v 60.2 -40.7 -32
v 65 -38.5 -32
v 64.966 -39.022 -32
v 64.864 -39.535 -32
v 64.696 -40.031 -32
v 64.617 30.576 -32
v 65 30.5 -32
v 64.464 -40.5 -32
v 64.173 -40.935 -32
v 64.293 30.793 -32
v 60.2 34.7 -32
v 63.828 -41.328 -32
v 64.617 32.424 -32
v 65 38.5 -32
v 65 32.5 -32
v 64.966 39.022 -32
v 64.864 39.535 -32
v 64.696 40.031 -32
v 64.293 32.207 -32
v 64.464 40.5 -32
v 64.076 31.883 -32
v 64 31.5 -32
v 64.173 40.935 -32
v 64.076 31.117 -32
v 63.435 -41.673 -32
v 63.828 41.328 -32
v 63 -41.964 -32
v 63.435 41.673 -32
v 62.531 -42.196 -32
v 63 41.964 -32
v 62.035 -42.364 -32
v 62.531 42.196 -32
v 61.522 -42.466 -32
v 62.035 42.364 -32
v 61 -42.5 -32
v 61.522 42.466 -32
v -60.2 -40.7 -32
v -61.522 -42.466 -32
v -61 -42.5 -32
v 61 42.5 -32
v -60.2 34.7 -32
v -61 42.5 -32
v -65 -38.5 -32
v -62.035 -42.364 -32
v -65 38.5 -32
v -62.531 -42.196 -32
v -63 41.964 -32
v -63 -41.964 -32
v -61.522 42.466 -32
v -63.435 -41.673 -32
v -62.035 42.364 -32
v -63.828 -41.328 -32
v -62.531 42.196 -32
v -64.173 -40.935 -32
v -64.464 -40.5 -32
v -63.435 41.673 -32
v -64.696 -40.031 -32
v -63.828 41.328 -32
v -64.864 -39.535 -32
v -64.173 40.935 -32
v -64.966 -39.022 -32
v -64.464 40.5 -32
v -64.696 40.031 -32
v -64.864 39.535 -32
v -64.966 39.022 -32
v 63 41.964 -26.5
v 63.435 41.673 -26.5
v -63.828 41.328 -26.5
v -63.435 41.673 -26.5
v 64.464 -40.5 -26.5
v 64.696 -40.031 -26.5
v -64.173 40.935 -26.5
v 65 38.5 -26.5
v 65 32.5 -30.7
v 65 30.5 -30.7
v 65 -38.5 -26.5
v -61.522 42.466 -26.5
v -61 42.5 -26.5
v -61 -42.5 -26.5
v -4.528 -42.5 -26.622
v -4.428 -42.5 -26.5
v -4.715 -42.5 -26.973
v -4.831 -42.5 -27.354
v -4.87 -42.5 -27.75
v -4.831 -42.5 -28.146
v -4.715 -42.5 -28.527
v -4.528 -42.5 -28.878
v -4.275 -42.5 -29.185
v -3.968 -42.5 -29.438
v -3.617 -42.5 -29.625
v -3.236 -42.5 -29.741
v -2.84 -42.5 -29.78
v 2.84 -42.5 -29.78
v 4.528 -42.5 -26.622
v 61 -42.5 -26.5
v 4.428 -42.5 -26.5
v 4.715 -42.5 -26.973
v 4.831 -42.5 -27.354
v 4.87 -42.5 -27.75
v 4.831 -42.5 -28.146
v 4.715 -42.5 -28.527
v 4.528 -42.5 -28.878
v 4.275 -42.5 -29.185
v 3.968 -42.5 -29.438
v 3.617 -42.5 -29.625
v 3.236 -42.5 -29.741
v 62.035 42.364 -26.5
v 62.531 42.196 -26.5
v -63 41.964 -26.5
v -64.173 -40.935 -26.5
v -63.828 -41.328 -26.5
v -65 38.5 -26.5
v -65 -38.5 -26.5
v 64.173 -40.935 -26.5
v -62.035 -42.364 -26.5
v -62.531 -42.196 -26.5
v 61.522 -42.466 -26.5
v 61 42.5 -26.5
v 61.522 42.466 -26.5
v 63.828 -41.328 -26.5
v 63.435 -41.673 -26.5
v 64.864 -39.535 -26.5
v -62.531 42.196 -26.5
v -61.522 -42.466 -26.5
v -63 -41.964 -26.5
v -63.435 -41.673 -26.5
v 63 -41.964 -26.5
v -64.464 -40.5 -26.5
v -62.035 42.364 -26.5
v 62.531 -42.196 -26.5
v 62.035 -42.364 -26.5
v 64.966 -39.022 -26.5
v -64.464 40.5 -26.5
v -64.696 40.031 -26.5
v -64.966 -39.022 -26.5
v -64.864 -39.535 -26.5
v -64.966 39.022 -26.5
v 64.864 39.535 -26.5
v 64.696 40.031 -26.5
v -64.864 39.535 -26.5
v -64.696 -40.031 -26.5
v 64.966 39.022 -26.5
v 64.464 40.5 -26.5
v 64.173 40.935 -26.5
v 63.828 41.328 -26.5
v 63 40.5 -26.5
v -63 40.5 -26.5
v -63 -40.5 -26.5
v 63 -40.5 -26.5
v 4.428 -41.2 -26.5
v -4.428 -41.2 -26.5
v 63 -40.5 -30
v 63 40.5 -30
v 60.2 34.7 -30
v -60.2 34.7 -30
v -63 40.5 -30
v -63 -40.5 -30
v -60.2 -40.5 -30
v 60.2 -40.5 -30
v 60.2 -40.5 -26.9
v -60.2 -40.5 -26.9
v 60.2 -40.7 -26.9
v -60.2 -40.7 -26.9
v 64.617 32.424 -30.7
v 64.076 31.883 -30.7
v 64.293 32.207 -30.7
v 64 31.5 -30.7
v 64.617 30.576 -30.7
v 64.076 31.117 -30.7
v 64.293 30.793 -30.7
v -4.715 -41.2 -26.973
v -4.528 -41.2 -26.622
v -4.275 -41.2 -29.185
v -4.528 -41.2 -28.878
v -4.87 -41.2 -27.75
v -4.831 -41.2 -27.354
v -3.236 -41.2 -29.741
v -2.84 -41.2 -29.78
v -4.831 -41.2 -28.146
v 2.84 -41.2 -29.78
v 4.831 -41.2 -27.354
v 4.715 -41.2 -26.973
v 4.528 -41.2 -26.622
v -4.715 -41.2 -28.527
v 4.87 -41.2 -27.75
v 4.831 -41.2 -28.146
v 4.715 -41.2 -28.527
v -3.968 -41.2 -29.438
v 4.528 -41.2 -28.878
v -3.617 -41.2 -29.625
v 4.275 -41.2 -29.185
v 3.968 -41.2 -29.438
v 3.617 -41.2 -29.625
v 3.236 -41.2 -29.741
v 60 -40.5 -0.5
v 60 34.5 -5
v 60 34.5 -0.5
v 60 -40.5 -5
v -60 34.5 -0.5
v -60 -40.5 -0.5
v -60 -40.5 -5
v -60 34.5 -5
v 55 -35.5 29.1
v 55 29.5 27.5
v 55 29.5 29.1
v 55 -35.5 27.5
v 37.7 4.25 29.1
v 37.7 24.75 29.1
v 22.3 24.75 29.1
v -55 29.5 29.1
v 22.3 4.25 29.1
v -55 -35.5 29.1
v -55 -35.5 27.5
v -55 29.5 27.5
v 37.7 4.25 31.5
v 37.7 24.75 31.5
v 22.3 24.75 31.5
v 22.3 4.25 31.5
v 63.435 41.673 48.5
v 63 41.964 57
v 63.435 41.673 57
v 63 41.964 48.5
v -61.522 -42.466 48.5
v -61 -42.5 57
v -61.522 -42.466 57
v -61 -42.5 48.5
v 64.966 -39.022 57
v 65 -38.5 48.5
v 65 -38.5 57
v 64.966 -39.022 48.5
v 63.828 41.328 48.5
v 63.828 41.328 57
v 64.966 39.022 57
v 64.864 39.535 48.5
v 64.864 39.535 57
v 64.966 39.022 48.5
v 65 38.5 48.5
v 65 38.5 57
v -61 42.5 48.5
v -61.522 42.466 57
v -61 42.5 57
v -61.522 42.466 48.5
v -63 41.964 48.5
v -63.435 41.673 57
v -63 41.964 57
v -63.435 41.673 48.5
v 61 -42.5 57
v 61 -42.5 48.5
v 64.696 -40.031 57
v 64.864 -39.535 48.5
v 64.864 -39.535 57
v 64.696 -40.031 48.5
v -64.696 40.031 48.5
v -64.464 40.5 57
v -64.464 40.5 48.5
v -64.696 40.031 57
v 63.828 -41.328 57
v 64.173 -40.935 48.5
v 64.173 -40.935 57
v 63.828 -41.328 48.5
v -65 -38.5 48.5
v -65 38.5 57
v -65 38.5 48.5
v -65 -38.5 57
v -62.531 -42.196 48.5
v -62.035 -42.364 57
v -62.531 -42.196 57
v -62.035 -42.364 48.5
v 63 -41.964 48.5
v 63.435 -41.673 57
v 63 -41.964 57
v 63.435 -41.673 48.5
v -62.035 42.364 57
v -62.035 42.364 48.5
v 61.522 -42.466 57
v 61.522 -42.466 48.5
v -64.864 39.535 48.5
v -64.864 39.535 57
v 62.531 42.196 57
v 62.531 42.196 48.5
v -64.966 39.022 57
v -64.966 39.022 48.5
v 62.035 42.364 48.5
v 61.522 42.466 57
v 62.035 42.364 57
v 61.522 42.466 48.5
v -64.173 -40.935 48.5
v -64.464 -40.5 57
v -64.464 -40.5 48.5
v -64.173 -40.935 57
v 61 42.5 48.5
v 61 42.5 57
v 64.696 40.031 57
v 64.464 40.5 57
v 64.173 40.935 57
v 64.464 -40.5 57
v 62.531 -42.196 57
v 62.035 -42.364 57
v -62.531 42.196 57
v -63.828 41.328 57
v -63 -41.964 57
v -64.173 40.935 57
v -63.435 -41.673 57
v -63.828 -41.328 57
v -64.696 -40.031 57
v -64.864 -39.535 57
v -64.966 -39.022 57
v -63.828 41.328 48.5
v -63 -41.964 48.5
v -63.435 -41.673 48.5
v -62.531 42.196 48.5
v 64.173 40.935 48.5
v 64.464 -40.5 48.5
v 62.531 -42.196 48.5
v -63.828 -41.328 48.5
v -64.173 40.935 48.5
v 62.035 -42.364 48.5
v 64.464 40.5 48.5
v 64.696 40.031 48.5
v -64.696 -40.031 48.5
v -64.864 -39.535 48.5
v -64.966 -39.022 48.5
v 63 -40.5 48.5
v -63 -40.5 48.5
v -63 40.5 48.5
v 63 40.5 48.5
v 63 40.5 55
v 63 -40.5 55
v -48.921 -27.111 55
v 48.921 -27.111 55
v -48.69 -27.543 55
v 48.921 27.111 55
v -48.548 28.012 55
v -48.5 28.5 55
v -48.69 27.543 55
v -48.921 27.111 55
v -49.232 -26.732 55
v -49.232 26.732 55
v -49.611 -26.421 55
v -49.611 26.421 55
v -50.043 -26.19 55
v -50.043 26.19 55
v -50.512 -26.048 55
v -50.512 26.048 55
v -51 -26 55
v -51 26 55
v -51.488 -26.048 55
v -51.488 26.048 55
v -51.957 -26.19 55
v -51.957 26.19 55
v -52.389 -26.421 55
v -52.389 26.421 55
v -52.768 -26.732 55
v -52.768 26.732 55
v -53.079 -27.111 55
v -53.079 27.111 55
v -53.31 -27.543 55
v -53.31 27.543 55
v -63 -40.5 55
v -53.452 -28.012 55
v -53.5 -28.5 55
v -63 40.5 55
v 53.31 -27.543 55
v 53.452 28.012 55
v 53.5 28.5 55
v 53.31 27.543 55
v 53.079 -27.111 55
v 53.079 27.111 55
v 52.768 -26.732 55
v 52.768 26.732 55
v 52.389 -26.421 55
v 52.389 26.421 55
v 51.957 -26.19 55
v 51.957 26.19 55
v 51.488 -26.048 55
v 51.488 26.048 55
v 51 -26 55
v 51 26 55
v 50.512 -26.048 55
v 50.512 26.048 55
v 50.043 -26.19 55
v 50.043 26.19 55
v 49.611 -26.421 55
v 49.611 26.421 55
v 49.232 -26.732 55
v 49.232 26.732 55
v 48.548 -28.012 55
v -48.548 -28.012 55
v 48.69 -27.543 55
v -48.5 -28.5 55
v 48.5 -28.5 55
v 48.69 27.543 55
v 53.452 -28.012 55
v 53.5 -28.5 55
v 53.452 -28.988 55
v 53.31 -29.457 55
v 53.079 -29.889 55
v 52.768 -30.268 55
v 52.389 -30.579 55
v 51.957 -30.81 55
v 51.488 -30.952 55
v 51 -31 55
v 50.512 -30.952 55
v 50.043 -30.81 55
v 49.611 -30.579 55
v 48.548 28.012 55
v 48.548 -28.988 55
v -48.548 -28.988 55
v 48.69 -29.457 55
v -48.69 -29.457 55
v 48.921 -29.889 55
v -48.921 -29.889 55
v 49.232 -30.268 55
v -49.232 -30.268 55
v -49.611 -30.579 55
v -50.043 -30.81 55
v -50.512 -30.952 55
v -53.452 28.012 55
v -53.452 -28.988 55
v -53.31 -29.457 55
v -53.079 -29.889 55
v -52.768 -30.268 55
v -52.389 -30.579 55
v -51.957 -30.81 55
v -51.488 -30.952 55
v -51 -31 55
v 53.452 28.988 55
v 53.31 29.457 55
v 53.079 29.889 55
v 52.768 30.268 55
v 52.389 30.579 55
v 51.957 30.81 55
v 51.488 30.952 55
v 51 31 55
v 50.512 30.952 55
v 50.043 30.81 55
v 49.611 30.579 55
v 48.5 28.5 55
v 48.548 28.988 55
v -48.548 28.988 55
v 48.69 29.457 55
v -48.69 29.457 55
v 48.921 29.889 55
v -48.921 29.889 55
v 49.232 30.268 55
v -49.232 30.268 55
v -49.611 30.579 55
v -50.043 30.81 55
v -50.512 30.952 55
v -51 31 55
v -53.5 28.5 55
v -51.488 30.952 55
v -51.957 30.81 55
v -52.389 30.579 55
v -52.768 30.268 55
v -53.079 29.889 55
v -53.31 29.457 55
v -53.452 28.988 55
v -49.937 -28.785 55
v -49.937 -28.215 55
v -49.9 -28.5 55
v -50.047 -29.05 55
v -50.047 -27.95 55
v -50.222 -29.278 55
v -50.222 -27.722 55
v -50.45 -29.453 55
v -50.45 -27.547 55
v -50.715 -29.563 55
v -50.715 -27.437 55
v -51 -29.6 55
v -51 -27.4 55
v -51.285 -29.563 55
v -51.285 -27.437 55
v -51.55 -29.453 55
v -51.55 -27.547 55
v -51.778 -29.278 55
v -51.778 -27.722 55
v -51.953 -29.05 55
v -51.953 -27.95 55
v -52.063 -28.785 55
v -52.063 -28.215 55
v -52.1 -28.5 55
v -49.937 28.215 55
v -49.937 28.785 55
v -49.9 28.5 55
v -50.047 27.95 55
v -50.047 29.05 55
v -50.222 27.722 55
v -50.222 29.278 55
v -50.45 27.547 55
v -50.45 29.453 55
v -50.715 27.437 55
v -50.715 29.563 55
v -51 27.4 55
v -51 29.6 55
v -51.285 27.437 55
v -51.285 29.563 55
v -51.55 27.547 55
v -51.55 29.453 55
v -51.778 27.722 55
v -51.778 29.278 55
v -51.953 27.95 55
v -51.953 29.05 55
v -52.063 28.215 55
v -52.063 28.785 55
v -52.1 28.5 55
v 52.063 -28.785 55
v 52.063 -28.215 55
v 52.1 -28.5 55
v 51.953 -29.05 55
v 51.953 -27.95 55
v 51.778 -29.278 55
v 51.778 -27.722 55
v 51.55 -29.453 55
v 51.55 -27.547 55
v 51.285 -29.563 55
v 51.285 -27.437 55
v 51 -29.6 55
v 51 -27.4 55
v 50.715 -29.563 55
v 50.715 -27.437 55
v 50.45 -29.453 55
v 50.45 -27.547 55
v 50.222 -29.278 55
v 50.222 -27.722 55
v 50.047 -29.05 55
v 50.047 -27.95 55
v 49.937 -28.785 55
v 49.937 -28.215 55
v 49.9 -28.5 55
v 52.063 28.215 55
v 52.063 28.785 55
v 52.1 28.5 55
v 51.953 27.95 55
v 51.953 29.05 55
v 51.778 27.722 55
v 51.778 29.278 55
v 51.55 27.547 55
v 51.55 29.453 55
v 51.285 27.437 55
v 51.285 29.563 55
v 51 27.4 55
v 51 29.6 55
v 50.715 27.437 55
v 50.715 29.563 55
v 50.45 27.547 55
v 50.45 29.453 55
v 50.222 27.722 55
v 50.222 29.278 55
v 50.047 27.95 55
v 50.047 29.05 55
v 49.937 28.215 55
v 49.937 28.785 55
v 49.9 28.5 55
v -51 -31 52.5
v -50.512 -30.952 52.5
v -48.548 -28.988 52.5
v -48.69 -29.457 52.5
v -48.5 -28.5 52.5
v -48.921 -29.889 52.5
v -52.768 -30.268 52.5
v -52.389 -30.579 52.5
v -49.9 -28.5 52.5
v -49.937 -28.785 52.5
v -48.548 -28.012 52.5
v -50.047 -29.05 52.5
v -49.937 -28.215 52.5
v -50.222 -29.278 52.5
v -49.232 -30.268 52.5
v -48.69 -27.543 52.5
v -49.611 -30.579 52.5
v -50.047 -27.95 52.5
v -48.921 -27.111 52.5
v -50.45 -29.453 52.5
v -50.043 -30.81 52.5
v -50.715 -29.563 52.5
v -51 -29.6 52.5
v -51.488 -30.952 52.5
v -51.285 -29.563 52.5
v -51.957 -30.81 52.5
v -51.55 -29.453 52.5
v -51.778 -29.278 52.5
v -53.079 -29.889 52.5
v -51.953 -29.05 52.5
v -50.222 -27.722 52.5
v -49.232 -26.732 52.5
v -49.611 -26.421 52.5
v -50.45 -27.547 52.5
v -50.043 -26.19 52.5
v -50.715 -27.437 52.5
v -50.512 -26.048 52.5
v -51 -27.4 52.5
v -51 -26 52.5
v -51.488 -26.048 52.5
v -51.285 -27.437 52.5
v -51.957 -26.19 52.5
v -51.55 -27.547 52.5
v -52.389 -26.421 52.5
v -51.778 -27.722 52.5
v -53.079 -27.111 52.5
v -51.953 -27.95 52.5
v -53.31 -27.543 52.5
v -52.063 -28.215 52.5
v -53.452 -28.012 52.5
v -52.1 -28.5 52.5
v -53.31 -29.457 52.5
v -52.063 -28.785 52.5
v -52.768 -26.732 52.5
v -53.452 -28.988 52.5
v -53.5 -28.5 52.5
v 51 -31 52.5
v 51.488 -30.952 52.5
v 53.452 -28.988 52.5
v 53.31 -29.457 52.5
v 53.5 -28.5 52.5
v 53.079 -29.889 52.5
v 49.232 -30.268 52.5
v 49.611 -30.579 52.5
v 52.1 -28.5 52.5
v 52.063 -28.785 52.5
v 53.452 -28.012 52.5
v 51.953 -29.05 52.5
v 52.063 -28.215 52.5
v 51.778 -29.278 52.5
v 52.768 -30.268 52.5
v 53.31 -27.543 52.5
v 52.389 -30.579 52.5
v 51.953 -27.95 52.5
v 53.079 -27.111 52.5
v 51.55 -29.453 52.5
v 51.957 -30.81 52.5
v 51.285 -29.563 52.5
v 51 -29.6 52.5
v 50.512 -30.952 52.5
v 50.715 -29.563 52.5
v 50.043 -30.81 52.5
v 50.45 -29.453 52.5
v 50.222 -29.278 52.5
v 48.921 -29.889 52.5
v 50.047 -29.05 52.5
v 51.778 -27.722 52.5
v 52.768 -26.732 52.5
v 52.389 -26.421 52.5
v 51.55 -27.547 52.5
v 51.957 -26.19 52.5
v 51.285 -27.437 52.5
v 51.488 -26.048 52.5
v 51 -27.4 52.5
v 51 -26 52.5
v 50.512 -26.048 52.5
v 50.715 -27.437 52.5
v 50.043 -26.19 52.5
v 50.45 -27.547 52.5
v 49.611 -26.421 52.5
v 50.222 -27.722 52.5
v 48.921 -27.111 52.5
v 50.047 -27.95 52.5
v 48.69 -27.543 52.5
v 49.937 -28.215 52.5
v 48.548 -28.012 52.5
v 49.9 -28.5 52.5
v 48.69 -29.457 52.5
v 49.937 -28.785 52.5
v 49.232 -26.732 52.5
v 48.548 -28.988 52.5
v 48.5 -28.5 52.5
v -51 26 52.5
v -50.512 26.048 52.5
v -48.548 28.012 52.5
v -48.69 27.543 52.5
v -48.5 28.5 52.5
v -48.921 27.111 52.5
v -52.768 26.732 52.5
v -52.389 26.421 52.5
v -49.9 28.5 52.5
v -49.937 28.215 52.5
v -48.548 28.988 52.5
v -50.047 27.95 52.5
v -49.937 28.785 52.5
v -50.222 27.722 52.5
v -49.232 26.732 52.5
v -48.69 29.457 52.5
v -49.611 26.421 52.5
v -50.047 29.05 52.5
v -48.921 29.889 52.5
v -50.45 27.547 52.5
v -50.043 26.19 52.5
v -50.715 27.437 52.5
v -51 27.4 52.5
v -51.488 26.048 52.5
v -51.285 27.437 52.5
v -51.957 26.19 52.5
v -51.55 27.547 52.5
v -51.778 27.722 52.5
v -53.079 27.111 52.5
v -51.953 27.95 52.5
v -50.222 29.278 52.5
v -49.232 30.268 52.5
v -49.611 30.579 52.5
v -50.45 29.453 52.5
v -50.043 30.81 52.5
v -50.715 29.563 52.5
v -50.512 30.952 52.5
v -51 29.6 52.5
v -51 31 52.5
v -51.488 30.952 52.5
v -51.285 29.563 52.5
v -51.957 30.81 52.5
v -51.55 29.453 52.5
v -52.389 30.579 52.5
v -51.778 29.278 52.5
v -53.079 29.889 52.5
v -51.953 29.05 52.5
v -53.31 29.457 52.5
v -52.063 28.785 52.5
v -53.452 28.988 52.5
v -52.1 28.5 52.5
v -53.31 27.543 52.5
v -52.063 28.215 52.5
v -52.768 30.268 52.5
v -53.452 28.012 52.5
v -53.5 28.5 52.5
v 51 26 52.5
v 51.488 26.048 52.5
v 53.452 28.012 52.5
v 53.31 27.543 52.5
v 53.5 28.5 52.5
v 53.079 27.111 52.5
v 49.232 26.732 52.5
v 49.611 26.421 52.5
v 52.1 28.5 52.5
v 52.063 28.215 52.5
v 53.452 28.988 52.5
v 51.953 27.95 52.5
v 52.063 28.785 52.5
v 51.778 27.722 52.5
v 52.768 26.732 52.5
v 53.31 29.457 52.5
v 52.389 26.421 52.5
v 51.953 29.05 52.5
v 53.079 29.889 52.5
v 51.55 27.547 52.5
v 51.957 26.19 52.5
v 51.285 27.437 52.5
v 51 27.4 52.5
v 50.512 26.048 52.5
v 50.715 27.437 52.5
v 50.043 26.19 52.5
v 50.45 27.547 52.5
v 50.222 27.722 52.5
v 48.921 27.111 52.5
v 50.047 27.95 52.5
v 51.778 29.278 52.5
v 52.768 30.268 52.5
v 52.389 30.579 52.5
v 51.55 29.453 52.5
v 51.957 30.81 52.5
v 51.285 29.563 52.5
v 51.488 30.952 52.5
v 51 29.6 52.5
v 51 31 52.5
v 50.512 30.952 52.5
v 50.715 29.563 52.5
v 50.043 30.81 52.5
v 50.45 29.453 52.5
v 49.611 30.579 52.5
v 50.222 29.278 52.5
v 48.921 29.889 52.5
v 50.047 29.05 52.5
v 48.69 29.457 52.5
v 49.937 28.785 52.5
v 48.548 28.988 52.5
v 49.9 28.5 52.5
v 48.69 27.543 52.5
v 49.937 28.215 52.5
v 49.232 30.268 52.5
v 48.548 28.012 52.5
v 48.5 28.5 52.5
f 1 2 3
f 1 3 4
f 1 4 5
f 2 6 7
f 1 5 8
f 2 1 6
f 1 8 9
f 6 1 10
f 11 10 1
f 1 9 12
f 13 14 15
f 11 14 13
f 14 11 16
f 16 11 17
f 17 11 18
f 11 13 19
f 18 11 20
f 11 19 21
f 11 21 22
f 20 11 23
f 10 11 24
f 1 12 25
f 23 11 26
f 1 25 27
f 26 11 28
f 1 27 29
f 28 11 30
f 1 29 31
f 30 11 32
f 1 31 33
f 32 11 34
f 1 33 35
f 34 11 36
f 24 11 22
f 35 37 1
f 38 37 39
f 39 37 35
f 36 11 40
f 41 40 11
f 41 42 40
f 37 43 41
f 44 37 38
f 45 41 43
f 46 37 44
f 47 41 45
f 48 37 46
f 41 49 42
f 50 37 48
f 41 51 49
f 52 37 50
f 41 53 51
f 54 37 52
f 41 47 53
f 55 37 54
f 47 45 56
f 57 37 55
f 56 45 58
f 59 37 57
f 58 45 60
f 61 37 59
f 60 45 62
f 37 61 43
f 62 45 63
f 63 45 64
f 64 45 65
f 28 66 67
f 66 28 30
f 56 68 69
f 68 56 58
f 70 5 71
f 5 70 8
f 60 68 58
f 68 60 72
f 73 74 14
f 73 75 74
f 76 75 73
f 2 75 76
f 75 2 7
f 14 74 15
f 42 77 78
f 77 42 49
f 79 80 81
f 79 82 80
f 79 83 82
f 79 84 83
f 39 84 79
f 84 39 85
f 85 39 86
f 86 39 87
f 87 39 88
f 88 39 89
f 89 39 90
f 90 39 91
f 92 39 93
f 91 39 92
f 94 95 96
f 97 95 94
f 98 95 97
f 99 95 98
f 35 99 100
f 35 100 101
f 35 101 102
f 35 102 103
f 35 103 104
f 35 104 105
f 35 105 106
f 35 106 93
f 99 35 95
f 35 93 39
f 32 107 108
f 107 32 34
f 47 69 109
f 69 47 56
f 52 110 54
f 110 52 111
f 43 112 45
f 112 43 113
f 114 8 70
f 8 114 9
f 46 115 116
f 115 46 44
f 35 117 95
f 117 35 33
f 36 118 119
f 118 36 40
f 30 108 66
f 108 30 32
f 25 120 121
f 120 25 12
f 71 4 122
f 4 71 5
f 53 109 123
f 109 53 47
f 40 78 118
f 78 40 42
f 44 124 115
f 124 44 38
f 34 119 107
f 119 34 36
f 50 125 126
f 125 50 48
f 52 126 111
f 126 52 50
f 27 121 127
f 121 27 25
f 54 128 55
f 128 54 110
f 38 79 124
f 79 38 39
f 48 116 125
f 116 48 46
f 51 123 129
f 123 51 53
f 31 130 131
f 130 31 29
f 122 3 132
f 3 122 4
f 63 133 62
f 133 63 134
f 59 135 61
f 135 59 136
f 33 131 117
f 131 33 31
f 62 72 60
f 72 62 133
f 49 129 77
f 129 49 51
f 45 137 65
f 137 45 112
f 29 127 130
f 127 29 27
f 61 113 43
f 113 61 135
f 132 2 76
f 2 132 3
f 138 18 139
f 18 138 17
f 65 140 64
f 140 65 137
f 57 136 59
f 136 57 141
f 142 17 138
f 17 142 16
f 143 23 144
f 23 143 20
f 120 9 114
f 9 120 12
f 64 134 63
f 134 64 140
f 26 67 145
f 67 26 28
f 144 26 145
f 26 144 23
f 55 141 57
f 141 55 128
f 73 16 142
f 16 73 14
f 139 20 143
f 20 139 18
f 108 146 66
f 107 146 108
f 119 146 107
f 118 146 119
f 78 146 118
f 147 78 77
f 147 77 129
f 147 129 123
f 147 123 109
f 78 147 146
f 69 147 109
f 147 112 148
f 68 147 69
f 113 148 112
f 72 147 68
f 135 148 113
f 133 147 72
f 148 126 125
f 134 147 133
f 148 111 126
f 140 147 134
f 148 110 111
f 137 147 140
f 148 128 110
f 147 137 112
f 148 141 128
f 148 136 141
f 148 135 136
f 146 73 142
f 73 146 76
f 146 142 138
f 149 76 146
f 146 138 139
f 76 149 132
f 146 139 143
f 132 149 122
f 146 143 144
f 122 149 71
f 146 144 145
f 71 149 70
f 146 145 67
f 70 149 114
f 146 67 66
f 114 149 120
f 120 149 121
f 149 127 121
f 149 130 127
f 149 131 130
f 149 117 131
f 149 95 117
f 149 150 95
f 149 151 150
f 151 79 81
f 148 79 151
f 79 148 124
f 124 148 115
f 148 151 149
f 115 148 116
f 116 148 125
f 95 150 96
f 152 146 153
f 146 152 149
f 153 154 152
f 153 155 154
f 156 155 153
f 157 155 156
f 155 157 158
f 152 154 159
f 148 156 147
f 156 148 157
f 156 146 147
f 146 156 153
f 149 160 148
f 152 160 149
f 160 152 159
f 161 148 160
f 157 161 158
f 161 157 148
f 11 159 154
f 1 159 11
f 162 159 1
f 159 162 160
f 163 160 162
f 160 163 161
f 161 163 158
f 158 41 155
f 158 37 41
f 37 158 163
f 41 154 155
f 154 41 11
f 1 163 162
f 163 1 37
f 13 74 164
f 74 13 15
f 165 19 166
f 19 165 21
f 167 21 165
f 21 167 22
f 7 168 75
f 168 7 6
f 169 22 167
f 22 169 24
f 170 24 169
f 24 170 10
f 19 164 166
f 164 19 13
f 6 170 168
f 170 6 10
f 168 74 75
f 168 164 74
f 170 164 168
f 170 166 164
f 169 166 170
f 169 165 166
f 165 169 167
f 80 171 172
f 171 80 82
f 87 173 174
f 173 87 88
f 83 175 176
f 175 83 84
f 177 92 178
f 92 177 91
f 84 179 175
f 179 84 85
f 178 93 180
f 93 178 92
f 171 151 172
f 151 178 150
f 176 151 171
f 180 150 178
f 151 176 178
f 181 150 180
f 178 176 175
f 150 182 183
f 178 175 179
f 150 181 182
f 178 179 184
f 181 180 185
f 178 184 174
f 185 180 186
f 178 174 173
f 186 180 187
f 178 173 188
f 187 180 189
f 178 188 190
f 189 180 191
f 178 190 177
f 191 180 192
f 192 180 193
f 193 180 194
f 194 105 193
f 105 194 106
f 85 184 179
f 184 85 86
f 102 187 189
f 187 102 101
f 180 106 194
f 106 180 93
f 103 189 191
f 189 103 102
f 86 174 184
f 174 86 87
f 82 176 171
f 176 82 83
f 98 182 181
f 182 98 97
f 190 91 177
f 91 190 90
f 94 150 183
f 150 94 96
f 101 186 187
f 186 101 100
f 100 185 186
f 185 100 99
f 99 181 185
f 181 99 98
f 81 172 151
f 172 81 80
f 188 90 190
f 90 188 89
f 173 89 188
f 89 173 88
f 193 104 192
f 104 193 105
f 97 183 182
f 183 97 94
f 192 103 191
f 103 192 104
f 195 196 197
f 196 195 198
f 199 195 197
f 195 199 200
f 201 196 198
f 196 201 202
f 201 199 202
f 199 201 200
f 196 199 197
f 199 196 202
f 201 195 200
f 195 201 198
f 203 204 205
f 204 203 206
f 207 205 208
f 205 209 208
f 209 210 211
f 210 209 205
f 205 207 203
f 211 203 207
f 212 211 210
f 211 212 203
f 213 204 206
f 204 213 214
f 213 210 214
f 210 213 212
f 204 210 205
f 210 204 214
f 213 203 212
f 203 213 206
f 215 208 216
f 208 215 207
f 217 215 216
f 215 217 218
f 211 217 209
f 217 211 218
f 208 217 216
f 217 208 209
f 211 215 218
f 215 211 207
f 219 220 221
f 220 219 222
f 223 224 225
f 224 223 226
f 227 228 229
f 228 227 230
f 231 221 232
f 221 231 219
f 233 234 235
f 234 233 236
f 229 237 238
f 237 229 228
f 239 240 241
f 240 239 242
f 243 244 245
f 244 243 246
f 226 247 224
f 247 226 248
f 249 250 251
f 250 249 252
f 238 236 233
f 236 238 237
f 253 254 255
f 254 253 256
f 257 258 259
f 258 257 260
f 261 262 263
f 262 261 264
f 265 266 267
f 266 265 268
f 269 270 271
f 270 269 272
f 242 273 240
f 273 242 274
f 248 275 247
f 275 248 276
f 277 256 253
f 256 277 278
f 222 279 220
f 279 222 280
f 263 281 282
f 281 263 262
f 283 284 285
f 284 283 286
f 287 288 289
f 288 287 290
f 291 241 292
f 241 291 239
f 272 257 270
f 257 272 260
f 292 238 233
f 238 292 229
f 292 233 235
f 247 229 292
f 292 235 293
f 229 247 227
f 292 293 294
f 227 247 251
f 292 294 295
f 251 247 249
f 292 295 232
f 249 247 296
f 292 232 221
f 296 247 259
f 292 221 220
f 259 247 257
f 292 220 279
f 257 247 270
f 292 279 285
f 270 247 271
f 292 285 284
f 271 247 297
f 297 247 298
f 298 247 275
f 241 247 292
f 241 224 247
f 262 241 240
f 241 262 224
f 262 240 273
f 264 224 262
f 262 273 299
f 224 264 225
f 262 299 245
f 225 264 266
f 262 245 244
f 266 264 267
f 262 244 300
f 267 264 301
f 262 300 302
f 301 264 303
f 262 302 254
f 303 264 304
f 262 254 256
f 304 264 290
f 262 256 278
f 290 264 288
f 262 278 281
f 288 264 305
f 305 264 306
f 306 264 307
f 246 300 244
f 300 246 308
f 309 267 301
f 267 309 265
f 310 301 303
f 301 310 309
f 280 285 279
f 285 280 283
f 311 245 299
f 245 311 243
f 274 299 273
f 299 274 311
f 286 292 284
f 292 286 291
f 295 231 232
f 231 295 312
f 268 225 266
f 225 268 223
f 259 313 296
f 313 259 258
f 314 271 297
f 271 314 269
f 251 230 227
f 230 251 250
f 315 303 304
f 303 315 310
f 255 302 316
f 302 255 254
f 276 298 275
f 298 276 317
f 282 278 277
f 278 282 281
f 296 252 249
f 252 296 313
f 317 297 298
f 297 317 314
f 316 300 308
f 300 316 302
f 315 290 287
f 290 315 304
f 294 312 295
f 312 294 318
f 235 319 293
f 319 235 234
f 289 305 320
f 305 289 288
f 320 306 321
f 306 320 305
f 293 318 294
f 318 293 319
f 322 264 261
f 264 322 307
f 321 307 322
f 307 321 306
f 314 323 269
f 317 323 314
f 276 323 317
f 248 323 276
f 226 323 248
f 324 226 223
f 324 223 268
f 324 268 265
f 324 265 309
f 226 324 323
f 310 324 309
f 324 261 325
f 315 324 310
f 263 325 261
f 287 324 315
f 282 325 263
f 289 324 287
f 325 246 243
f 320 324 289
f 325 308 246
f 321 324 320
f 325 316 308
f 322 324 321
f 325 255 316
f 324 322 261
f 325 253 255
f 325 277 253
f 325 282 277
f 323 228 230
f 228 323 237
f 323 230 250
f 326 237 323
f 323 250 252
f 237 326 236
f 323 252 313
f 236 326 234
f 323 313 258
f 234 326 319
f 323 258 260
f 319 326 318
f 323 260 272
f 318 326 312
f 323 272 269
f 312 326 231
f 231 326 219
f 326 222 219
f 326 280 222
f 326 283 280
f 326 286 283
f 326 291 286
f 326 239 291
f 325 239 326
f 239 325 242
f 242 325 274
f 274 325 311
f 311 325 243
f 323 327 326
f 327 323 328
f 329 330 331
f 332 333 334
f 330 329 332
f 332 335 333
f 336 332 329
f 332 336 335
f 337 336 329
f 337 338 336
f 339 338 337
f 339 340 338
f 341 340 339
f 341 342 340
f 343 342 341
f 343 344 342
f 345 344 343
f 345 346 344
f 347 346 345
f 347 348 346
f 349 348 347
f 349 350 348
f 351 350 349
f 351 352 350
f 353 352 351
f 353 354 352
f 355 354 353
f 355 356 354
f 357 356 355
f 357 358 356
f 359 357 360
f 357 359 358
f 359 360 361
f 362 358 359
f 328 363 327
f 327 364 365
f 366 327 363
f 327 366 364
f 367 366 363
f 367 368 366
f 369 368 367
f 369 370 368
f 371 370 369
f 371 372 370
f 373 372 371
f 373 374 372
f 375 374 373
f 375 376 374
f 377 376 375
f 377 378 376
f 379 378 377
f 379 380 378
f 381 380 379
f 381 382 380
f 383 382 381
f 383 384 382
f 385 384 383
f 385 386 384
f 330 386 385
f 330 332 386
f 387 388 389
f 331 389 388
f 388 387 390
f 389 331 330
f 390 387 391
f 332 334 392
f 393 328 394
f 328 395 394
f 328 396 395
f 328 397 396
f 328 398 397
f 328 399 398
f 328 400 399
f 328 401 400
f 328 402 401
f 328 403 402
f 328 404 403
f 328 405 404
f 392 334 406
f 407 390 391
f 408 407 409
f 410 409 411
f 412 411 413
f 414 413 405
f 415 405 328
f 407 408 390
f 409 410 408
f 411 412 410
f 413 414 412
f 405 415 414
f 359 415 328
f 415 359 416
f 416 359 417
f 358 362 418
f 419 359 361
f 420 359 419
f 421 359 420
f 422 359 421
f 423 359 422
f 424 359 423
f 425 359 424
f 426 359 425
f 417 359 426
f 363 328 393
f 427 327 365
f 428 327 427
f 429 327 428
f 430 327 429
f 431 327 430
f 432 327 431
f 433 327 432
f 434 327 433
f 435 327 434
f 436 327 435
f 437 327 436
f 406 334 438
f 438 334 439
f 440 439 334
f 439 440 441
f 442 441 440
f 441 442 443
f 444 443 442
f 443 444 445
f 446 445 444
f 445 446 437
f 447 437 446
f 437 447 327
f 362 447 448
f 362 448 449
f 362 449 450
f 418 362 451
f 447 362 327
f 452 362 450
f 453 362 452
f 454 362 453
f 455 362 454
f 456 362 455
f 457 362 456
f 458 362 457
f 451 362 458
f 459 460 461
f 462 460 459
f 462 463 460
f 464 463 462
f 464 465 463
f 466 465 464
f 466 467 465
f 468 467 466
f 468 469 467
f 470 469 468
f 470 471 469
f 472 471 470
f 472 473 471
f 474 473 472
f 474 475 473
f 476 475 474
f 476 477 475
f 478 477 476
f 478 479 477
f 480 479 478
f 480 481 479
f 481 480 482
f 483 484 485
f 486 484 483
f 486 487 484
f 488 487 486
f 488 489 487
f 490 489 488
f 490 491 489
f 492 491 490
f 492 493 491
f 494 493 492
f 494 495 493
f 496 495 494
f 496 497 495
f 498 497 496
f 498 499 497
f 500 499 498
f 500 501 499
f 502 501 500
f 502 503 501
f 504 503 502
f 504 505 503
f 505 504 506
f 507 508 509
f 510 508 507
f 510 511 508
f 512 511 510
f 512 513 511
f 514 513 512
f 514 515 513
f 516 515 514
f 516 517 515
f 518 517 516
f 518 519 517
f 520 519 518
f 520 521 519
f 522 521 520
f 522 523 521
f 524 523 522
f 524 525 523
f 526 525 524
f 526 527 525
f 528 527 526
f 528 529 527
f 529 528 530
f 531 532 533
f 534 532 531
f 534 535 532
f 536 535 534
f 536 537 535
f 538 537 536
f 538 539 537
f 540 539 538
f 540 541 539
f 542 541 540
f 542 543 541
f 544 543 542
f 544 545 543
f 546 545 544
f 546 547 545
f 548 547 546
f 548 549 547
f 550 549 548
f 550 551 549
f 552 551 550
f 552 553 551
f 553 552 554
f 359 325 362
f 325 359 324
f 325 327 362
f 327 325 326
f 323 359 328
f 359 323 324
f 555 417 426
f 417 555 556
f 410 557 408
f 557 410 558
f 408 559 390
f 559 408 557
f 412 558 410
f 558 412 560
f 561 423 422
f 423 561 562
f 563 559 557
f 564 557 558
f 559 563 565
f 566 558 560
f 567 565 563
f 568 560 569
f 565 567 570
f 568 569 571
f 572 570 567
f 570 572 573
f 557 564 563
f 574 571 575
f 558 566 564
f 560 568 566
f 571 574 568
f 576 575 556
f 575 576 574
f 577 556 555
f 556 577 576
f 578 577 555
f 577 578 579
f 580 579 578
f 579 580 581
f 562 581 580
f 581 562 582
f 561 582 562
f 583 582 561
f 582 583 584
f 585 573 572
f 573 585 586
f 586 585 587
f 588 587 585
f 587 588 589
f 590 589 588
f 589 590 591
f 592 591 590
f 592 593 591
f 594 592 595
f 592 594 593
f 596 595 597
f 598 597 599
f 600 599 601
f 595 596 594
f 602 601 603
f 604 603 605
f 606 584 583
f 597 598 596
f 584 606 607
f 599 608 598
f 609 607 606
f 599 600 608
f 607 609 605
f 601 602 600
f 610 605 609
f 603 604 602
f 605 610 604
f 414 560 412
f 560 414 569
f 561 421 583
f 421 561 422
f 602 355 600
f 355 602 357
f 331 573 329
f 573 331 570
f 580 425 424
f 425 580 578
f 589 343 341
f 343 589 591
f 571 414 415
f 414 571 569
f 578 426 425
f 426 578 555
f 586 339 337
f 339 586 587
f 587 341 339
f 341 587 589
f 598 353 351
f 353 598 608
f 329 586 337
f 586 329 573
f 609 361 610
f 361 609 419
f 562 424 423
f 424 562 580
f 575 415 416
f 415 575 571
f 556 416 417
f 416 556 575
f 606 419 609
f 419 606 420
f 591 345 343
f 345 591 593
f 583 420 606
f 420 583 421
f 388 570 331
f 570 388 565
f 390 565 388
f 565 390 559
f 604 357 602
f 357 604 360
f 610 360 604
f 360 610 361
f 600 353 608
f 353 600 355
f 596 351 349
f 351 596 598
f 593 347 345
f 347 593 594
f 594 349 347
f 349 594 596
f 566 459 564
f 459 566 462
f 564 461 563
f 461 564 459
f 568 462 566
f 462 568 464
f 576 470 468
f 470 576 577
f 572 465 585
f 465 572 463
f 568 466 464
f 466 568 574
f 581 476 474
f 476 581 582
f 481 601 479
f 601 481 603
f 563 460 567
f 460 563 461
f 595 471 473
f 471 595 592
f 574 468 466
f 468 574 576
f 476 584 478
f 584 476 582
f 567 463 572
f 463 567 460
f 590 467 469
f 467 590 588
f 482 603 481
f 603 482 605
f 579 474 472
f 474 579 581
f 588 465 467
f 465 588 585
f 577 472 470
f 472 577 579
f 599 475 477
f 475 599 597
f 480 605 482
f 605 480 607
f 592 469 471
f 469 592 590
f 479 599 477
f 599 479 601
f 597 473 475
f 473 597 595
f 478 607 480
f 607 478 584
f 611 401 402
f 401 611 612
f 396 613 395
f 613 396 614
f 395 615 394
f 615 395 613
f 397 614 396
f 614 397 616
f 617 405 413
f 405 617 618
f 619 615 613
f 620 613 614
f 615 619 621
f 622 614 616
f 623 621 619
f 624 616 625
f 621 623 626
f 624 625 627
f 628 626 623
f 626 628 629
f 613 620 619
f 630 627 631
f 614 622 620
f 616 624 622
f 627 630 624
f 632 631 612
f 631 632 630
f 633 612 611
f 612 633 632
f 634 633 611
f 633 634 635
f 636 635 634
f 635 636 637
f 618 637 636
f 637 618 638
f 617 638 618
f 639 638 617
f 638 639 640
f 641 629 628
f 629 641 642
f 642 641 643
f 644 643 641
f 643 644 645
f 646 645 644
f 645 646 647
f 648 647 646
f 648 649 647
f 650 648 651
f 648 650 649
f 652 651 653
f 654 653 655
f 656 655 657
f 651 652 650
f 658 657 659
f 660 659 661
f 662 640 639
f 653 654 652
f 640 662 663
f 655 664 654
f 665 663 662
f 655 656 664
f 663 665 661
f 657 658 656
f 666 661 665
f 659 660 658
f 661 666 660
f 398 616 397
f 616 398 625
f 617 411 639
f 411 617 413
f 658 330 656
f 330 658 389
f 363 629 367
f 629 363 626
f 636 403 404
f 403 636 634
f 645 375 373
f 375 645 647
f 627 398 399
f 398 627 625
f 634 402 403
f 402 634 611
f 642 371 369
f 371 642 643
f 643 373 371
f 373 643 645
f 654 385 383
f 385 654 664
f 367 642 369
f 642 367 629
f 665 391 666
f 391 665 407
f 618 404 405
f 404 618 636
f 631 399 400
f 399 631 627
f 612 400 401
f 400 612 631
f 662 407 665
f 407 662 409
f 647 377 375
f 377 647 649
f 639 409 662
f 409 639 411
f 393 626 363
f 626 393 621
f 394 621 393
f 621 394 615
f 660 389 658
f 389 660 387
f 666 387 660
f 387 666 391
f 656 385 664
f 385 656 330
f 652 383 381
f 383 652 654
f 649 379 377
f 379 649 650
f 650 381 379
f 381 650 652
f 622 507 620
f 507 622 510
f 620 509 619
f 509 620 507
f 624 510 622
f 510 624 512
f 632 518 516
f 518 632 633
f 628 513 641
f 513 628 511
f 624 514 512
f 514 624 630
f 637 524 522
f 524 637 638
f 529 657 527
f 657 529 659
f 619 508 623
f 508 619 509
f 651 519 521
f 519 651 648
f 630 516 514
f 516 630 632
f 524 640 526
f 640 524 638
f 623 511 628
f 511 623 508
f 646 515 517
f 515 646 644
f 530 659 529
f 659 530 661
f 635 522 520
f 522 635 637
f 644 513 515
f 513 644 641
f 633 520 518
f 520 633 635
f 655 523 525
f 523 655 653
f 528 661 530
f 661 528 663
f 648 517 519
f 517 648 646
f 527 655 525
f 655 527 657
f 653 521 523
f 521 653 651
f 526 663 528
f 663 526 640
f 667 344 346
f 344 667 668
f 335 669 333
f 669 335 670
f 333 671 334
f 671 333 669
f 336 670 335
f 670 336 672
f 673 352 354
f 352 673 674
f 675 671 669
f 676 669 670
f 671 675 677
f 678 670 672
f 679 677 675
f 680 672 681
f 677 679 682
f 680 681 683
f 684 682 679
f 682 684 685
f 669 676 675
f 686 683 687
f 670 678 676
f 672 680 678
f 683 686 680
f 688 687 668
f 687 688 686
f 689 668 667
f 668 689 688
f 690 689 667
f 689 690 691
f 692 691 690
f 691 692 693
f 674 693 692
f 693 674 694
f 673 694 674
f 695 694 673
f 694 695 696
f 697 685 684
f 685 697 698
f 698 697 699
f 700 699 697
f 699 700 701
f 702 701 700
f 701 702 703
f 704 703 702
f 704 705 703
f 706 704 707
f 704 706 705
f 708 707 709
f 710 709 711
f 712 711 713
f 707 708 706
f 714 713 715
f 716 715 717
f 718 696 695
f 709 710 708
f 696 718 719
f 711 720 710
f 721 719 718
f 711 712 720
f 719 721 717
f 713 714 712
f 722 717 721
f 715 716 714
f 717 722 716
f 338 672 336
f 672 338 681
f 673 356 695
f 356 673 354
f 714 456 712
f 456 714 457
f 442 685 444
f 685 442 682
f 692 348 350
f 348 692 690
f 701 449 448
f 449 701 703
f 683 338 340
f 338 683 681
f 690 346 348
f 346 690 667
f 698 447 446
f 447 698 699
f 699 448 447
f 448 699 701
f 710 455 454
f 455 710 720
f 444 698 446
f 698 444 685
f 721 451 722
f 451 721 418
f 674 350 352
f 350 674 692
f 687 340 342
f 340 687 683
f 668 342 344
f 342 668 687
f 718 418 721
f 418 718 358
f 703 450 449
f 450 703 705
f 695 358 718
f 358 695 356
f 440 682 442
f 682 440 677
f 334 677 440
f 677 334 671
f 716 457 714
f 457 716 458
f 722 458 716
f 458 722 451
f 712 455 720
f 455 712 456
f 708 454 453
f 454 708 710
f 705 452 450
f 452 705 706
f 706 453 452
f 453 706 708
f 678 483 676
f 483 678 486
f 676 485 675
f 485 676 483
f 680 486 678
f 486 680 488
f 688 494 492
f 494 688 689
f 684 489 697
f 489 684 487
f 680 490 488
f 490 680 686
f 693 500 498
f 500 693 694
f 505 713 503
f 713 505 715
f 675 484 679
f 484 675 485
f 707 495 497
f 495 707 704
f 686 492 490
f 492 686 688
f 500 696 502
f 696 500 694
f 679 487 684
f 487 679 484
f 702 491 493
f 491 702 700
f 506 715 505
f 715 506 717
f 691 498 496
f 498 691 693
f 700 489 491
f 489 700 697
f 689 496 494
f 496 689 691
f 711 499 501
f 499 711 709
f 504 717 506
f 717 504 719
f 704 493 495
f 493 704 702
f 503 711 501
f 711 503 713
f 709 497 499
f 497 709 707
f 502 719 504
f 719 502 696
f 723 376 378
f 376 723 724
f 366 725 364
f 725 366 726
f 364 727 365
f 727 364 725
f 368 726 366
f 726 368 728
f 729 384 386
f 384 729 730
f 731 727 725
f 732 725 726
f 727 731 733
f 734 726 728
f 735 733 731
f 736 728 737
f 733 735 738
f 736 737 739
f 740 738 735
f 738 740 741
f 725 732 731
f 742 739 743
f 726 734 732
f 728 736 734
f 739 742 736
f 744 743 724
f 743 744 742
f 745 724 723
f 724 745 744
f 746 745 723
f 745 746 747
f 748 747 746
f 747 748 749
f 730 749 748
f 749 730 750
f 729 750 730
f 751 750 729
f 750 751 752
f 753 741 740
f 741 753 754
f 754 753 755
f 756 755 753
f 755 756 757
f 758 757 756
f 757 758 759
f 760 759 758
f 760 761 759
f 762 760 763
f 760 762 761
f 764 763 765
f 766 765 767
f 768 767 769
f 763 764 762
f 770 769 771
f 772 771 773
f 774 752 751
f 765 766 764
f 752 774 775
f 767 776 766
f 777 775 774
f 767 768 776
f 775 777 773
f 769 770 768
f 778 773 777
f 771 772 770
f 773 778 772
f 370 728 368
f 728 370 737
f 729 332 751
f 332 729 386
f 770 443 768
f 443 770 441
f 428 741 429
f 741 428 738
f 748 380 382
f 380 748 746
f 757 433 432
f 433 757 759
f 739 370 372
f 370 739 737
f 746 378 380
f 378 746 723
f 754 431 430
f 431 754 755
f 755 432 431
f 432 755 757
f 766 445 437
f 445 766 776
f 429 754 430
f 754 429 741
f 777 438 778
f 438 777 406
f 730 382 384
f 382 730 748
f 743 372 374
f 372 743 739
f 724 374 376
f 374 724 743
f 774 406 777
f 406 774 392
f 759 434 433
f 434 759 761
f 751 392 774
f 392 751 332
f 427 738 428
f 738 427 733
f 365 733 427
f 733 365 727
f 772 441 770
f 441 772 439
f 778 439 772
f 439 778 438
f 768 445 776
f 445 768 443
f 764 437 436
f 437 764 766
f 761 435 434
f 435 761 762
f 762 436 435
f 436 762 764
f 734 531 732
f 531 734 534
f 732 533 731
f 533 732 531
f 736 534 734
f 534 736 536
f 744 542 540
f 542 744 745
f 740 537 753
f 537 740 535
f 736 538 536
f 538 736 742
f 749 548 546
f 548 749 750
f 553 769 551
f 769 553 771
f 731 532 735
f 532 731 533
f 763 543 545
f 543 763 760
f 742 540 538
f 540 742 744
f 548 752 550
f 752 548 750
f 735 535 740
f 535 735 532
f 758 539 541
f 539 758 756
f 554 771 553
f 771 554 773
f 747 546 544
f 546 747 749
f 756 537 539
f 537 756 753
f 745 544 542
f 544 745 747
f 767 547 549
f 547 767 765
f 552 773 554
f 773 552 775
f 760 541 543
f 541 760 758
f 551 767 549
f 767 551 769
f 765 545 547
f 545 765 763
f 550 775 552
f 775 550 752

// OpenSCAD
union() {
	translate(v = [0, 0, -25.0]) {
		difference() {
			difference() {
				difference() {
					difference() {
						difference() {
							difference() {
								union() {
									union() {
										intersection() {
											hull() {
												translate(v = [-61.0, -38.5, 0]) {
													cylinder($fn = 48, center = true, h = 14.0, r = 4.0);
												}
												translate(v = [-61.0, 38.5, 0]) {
													cylinder($fn = 48, center = true, h = 14.0, r = 4.0);
												}
												translate(v = [61.0, -38.5, 0]) {
													cylinder($fn = 48, center = true, h = 14.0, r = 4.0);
												}
												translate(v = [61.0, 38.5, 0]) {
													cylinder($fn = 48, center = true, h = 14.0, r = 4.0);
												}
											}
											translate(v = [0, 0, -4.25]) {
												cube(center = true, size = [132.0, 87.0, 5.5]);
											}
										}
										translate(v = [0, 0, -2.1]) {
											difference() {
												hull() {
													translate(v = [-61.0, -38.5, 0]) {
														cylinder($fn = 48, center = true, h = 1.2, r = 2.8);
													}
													translate(v = [-61.0, 38.5, 0]) {
														cylinder($fn = 48, center = true, h = 1.2, r = 2.8);
													}
													translate(v = [61.0, -38.5, 0]) {
														cylinder($fn = 48, center = true, h = 1.2, r = 2.8);
													}
													translate(v = [61.0, 38.5, 0]) {
														cylinder($fn = 48, center = true, h = 1.2, r = 2.8);
													}
												}
												hull() {
													translate(v = [-61.0, -38.5, 0]) {
														cylinder($fn = 48, center = true, h = 1.4, r = 1.2);
													}
													translate(v = [-61.0, 38.5, 0]) {
														cylinder($fn = 48, center = true, h = 1.4, r = 1.2);
													}
													translate(v = [61.0, -38.5, 0]) {
														cylinder($fn = 48, center = true, h = 1.4, r = 1.2);
													}
													translate(v = [61.0, 38.5, 0]) {
														cylinder($fn = 48, center = true, h = 1.4, r = 1.2);
													}
												}
											}
										}
									}
									union() {
										translate(v = [-60.0, 15.75, -2.0]) {
											rotate(a = [0, 0, 90]) {
												union() {
													cube(center = true, size = [8.0, 1.0, 3.0]);
													translate(v = [0, -0.75, 1.5]) {
														cube(center = true, size = [8.0, 1.5, 1.0]);
													}
												}
											}
										}
										translate(v = [-60.0, -21.75, -2.0]) {
											rotate(a = [0, 0, 90]) {
												union() {
													cube(center = true, size = [8.0, 1.0, 3.0]);
													translate(v = [0, -0.75, 1.5]) {
														cube(center = true, size = [8.0, 1.5, 1.0]);
													}
												}
											}
										}
										translate(v = [60.0, 15.75, -2.0]) {
											rotate(a = [0, 0, -90]) {
												union() {
													cube(center = true, size = [8.0, 1.0, 3.0]);
													translate(v = [0, -0.75, 1.5]) {
														cube(center = true, size = [8.0, 1.5, 1.0]);
													}
												}
											}
										}
										translate(v = [60.0, -21.75, -2.0]) {
											rotate(a = [0, 0, -90]) {
												union() {
													cube(center = true, size = [8.0, 1.0, 3.0]);
													translate(v = [0, -0.75, 1.5]) {
														cube(center = true, size = [8.0, 1.5, 1.0]);
													}
												}
											}
										}
									}
								}
								cube(center = true, size = [126.0, 81.0, 10.0]);
							}
							translate(v = [0, -3.0, -4.5]) {
								cube(center = true, size = [120.4, 75.4, 5.2]);
							}
						}
						translate(v = [0, -3.0, -7.0]) {
							cube(center = true, size = [109.0, 65.8, 2.6]);
						}
					}
					translate(v = [0, -48.5, -7.0]) {
						union() {
							translate(v = [-14.0, 0, 0]) {
								cylinder($fn = 32, center = true, d = 8.0, h = 2.6);
							}
							translate(v = [0.0, 0, 0]) {
								cylinder($fn = 32, center = true, d = 8.0, h = 2.6);
							}
							translate(v = [14.0, 0, 0]) {
								cylinder($fn = 32, center = true, d = 8.0, h = 2.6);
							}
						}
					}
				}
				translate(v = [65.0, 31.5, -7.0]) {
					cylinder($fn = 16, center = true, d = 2.0, h = 2.6);
				}
			}
			translate(v = [0, -42.5, -2.75]) {
				rotate(a = [90, 0, 0]) {
					linear_extrude(center = true, height = 2.6) {
						hull() {
							translate(v = [-2.84, 0]) {
								circle($fn = 32, r = 2.0300000000000002);
							}
							translate(v = [2.84, 0]) {
								circle($fn = 32, r = 2.0300000000000002);
							}
						}
					}
				}
			}
		}
	}
	translate(v = [0, 0, 0]) {
		translate(v = [0, -3.0, -2.75]) {
			union() {
				color(alpha = 0.5, c = "DodgerBlue") {
					cube(center = true, size = [120.0, 75.0, 4.5]);
				}
				color(alpha = 0.7, c = "LightBlue") {
					translate(v = [0, 0, 1.75]) {
						cube(center = true, size = [108.0, 64.8, 1.0]);
					}
				}
			}
		}
	}
	translate(v = [0, 0, 25.0]) {
		translate(v = [0, -3.0, 3.3]) {
			union() {
				color(alpha = 0.5, c = "ForestGreen") {
					cube(center = true, size = [110.0, 65.0, 1.6]);
				}
				color(alpha = 0.6, c = "DarkGreen") {
					translate(v = [30.0, 17.5, 2.0]) {
						cube(center = true, size = [15.4, 20.5, 2.4]);
					}
				}
			}
		}
	}
	translate(v = [0, 0, 50.0]) {
		union() {
			difference() {
				difference() {
					intersection() {
						hull() {
							translate(v = [-61.0, -38.5, 0]) {
								cylinder($fn = 48, center = true, h = 14.0, r = 4.0);
							}
							translate(v = [-61.0, 38.5, 0]) {
								cylinder($fn = 48, center = true, h = 14.0, r = 4.0);
							}
							translate(v = [61.0, -38.5, 0]) {
								cylinder($fn = 48, center = true, h = 14.0, r = 4.0);
							}
							translate(v = [61.0, 38.5, 0]) {
								cylinder($fn = 48, center = true, h = 14.0, r = 4.0);
							}
						}
						translate(v = [0, 0, 2.75]) {
							cube(center = true, size = [132.0, 87.0, 8.5]);
						}
					}
					translate(v = [0, 0, -2.3]) {
						difference() {
							hull() {
								translate(v = [-61.099999999999994, -38.6, 0]) {
									cylinder($fn = 48, center = true, h = 1.6, r = 3.2);
								}
								translate(v = [-61.099999999999994, 38.6, 0]) {
									cylinder($fn = 48, center = true, h = 1.6, r = 3.2);
								}
								translate(v = [61.099999999999994, -38.6, 0]) {
									cylinder($fn = 48, center = true, h = 1.6, r = 3.2);
								}
								translate(v = [61.099999999999994, 38.6, 0]) {
									cylinder($fn = 48, center = true, h = 1.6, r = 3.2);
								}
							}
							hull() {
								translate(v = [-60.9, -38.4, 0]) {
									cylinder($fn = 48, center = true, h = 1.8, r = 0.7999999999999998);
								}
								translate(v = [-60.9, 38.4, 0]) {
									cylinder($fn = 48, center = true, h = 1.8, r = 0.7999999999999998);
								}
								translate(v = [60.9, -38.4, 0]) {
									cylinder($fn = 48, center = true, h = 1.8, r = 0.7999999999999998);
								}
								translate(v = [60.9, 38.4, 0]) {
									cylinder($fn = 48, center = true, h = 1.8, r = 0.7999999999999998);
								}
							}
						}
					}
				}
				cube(center = true, size = [126.0, 81.0, 10.0]);
			}
			union() {
				translate(v = [-51.0, -28.5, 5.0]) {
					rotate(a = [180, 0, 0]) {
						difference() {
							cylinder($fn = 32, center = false, d = 5.0, h = 2.5);
							translate(v = [0, 0, -0.1]) {
								cylinder($fn = 24, center = false, d = 2.2, h = 2.7);
							}
						}
					}
				}
				translate(v = [51.0, -28.5, 5.0]) {
					rotate(a = [180, 0, 0]) {
						difference() {
							cylinder($fn = 32, center = false, d = 5.0, h = 2.5);
							translate(v = [0, 0, -0.1]) {
								cylinder($fn = 24, center = false, d = 2.2, h = 2.7);
							}
						}
					}
				}
				translate(v = [-51.0, 28.5, 5.0]) {
					rotate(a = [180, 0, 0]) {
						difference() {
							cylinder($fn = 32, center = false, d = 5.0, h = 2.5);
							translate(v = [0, 0, -0.1]) {
								cylinder($fn = 24, center = false, d = 2.2, h = 2.7);
							}
						}
					}
				}
				translate(v = [51.0, 28.5, 5.0]) {
					rotate(a = [180, 0, 0]) {
						difference() {
							cylinder($fn = 32, center = false, d = 5.0, h = 2.5);
							translate(v = [0, 0, -0.1]) {
								cylinder($fn = 24, center = false, d = 2.2, h = 2.7);
							}
						}
					}
				}
			}
		}
	}
}
